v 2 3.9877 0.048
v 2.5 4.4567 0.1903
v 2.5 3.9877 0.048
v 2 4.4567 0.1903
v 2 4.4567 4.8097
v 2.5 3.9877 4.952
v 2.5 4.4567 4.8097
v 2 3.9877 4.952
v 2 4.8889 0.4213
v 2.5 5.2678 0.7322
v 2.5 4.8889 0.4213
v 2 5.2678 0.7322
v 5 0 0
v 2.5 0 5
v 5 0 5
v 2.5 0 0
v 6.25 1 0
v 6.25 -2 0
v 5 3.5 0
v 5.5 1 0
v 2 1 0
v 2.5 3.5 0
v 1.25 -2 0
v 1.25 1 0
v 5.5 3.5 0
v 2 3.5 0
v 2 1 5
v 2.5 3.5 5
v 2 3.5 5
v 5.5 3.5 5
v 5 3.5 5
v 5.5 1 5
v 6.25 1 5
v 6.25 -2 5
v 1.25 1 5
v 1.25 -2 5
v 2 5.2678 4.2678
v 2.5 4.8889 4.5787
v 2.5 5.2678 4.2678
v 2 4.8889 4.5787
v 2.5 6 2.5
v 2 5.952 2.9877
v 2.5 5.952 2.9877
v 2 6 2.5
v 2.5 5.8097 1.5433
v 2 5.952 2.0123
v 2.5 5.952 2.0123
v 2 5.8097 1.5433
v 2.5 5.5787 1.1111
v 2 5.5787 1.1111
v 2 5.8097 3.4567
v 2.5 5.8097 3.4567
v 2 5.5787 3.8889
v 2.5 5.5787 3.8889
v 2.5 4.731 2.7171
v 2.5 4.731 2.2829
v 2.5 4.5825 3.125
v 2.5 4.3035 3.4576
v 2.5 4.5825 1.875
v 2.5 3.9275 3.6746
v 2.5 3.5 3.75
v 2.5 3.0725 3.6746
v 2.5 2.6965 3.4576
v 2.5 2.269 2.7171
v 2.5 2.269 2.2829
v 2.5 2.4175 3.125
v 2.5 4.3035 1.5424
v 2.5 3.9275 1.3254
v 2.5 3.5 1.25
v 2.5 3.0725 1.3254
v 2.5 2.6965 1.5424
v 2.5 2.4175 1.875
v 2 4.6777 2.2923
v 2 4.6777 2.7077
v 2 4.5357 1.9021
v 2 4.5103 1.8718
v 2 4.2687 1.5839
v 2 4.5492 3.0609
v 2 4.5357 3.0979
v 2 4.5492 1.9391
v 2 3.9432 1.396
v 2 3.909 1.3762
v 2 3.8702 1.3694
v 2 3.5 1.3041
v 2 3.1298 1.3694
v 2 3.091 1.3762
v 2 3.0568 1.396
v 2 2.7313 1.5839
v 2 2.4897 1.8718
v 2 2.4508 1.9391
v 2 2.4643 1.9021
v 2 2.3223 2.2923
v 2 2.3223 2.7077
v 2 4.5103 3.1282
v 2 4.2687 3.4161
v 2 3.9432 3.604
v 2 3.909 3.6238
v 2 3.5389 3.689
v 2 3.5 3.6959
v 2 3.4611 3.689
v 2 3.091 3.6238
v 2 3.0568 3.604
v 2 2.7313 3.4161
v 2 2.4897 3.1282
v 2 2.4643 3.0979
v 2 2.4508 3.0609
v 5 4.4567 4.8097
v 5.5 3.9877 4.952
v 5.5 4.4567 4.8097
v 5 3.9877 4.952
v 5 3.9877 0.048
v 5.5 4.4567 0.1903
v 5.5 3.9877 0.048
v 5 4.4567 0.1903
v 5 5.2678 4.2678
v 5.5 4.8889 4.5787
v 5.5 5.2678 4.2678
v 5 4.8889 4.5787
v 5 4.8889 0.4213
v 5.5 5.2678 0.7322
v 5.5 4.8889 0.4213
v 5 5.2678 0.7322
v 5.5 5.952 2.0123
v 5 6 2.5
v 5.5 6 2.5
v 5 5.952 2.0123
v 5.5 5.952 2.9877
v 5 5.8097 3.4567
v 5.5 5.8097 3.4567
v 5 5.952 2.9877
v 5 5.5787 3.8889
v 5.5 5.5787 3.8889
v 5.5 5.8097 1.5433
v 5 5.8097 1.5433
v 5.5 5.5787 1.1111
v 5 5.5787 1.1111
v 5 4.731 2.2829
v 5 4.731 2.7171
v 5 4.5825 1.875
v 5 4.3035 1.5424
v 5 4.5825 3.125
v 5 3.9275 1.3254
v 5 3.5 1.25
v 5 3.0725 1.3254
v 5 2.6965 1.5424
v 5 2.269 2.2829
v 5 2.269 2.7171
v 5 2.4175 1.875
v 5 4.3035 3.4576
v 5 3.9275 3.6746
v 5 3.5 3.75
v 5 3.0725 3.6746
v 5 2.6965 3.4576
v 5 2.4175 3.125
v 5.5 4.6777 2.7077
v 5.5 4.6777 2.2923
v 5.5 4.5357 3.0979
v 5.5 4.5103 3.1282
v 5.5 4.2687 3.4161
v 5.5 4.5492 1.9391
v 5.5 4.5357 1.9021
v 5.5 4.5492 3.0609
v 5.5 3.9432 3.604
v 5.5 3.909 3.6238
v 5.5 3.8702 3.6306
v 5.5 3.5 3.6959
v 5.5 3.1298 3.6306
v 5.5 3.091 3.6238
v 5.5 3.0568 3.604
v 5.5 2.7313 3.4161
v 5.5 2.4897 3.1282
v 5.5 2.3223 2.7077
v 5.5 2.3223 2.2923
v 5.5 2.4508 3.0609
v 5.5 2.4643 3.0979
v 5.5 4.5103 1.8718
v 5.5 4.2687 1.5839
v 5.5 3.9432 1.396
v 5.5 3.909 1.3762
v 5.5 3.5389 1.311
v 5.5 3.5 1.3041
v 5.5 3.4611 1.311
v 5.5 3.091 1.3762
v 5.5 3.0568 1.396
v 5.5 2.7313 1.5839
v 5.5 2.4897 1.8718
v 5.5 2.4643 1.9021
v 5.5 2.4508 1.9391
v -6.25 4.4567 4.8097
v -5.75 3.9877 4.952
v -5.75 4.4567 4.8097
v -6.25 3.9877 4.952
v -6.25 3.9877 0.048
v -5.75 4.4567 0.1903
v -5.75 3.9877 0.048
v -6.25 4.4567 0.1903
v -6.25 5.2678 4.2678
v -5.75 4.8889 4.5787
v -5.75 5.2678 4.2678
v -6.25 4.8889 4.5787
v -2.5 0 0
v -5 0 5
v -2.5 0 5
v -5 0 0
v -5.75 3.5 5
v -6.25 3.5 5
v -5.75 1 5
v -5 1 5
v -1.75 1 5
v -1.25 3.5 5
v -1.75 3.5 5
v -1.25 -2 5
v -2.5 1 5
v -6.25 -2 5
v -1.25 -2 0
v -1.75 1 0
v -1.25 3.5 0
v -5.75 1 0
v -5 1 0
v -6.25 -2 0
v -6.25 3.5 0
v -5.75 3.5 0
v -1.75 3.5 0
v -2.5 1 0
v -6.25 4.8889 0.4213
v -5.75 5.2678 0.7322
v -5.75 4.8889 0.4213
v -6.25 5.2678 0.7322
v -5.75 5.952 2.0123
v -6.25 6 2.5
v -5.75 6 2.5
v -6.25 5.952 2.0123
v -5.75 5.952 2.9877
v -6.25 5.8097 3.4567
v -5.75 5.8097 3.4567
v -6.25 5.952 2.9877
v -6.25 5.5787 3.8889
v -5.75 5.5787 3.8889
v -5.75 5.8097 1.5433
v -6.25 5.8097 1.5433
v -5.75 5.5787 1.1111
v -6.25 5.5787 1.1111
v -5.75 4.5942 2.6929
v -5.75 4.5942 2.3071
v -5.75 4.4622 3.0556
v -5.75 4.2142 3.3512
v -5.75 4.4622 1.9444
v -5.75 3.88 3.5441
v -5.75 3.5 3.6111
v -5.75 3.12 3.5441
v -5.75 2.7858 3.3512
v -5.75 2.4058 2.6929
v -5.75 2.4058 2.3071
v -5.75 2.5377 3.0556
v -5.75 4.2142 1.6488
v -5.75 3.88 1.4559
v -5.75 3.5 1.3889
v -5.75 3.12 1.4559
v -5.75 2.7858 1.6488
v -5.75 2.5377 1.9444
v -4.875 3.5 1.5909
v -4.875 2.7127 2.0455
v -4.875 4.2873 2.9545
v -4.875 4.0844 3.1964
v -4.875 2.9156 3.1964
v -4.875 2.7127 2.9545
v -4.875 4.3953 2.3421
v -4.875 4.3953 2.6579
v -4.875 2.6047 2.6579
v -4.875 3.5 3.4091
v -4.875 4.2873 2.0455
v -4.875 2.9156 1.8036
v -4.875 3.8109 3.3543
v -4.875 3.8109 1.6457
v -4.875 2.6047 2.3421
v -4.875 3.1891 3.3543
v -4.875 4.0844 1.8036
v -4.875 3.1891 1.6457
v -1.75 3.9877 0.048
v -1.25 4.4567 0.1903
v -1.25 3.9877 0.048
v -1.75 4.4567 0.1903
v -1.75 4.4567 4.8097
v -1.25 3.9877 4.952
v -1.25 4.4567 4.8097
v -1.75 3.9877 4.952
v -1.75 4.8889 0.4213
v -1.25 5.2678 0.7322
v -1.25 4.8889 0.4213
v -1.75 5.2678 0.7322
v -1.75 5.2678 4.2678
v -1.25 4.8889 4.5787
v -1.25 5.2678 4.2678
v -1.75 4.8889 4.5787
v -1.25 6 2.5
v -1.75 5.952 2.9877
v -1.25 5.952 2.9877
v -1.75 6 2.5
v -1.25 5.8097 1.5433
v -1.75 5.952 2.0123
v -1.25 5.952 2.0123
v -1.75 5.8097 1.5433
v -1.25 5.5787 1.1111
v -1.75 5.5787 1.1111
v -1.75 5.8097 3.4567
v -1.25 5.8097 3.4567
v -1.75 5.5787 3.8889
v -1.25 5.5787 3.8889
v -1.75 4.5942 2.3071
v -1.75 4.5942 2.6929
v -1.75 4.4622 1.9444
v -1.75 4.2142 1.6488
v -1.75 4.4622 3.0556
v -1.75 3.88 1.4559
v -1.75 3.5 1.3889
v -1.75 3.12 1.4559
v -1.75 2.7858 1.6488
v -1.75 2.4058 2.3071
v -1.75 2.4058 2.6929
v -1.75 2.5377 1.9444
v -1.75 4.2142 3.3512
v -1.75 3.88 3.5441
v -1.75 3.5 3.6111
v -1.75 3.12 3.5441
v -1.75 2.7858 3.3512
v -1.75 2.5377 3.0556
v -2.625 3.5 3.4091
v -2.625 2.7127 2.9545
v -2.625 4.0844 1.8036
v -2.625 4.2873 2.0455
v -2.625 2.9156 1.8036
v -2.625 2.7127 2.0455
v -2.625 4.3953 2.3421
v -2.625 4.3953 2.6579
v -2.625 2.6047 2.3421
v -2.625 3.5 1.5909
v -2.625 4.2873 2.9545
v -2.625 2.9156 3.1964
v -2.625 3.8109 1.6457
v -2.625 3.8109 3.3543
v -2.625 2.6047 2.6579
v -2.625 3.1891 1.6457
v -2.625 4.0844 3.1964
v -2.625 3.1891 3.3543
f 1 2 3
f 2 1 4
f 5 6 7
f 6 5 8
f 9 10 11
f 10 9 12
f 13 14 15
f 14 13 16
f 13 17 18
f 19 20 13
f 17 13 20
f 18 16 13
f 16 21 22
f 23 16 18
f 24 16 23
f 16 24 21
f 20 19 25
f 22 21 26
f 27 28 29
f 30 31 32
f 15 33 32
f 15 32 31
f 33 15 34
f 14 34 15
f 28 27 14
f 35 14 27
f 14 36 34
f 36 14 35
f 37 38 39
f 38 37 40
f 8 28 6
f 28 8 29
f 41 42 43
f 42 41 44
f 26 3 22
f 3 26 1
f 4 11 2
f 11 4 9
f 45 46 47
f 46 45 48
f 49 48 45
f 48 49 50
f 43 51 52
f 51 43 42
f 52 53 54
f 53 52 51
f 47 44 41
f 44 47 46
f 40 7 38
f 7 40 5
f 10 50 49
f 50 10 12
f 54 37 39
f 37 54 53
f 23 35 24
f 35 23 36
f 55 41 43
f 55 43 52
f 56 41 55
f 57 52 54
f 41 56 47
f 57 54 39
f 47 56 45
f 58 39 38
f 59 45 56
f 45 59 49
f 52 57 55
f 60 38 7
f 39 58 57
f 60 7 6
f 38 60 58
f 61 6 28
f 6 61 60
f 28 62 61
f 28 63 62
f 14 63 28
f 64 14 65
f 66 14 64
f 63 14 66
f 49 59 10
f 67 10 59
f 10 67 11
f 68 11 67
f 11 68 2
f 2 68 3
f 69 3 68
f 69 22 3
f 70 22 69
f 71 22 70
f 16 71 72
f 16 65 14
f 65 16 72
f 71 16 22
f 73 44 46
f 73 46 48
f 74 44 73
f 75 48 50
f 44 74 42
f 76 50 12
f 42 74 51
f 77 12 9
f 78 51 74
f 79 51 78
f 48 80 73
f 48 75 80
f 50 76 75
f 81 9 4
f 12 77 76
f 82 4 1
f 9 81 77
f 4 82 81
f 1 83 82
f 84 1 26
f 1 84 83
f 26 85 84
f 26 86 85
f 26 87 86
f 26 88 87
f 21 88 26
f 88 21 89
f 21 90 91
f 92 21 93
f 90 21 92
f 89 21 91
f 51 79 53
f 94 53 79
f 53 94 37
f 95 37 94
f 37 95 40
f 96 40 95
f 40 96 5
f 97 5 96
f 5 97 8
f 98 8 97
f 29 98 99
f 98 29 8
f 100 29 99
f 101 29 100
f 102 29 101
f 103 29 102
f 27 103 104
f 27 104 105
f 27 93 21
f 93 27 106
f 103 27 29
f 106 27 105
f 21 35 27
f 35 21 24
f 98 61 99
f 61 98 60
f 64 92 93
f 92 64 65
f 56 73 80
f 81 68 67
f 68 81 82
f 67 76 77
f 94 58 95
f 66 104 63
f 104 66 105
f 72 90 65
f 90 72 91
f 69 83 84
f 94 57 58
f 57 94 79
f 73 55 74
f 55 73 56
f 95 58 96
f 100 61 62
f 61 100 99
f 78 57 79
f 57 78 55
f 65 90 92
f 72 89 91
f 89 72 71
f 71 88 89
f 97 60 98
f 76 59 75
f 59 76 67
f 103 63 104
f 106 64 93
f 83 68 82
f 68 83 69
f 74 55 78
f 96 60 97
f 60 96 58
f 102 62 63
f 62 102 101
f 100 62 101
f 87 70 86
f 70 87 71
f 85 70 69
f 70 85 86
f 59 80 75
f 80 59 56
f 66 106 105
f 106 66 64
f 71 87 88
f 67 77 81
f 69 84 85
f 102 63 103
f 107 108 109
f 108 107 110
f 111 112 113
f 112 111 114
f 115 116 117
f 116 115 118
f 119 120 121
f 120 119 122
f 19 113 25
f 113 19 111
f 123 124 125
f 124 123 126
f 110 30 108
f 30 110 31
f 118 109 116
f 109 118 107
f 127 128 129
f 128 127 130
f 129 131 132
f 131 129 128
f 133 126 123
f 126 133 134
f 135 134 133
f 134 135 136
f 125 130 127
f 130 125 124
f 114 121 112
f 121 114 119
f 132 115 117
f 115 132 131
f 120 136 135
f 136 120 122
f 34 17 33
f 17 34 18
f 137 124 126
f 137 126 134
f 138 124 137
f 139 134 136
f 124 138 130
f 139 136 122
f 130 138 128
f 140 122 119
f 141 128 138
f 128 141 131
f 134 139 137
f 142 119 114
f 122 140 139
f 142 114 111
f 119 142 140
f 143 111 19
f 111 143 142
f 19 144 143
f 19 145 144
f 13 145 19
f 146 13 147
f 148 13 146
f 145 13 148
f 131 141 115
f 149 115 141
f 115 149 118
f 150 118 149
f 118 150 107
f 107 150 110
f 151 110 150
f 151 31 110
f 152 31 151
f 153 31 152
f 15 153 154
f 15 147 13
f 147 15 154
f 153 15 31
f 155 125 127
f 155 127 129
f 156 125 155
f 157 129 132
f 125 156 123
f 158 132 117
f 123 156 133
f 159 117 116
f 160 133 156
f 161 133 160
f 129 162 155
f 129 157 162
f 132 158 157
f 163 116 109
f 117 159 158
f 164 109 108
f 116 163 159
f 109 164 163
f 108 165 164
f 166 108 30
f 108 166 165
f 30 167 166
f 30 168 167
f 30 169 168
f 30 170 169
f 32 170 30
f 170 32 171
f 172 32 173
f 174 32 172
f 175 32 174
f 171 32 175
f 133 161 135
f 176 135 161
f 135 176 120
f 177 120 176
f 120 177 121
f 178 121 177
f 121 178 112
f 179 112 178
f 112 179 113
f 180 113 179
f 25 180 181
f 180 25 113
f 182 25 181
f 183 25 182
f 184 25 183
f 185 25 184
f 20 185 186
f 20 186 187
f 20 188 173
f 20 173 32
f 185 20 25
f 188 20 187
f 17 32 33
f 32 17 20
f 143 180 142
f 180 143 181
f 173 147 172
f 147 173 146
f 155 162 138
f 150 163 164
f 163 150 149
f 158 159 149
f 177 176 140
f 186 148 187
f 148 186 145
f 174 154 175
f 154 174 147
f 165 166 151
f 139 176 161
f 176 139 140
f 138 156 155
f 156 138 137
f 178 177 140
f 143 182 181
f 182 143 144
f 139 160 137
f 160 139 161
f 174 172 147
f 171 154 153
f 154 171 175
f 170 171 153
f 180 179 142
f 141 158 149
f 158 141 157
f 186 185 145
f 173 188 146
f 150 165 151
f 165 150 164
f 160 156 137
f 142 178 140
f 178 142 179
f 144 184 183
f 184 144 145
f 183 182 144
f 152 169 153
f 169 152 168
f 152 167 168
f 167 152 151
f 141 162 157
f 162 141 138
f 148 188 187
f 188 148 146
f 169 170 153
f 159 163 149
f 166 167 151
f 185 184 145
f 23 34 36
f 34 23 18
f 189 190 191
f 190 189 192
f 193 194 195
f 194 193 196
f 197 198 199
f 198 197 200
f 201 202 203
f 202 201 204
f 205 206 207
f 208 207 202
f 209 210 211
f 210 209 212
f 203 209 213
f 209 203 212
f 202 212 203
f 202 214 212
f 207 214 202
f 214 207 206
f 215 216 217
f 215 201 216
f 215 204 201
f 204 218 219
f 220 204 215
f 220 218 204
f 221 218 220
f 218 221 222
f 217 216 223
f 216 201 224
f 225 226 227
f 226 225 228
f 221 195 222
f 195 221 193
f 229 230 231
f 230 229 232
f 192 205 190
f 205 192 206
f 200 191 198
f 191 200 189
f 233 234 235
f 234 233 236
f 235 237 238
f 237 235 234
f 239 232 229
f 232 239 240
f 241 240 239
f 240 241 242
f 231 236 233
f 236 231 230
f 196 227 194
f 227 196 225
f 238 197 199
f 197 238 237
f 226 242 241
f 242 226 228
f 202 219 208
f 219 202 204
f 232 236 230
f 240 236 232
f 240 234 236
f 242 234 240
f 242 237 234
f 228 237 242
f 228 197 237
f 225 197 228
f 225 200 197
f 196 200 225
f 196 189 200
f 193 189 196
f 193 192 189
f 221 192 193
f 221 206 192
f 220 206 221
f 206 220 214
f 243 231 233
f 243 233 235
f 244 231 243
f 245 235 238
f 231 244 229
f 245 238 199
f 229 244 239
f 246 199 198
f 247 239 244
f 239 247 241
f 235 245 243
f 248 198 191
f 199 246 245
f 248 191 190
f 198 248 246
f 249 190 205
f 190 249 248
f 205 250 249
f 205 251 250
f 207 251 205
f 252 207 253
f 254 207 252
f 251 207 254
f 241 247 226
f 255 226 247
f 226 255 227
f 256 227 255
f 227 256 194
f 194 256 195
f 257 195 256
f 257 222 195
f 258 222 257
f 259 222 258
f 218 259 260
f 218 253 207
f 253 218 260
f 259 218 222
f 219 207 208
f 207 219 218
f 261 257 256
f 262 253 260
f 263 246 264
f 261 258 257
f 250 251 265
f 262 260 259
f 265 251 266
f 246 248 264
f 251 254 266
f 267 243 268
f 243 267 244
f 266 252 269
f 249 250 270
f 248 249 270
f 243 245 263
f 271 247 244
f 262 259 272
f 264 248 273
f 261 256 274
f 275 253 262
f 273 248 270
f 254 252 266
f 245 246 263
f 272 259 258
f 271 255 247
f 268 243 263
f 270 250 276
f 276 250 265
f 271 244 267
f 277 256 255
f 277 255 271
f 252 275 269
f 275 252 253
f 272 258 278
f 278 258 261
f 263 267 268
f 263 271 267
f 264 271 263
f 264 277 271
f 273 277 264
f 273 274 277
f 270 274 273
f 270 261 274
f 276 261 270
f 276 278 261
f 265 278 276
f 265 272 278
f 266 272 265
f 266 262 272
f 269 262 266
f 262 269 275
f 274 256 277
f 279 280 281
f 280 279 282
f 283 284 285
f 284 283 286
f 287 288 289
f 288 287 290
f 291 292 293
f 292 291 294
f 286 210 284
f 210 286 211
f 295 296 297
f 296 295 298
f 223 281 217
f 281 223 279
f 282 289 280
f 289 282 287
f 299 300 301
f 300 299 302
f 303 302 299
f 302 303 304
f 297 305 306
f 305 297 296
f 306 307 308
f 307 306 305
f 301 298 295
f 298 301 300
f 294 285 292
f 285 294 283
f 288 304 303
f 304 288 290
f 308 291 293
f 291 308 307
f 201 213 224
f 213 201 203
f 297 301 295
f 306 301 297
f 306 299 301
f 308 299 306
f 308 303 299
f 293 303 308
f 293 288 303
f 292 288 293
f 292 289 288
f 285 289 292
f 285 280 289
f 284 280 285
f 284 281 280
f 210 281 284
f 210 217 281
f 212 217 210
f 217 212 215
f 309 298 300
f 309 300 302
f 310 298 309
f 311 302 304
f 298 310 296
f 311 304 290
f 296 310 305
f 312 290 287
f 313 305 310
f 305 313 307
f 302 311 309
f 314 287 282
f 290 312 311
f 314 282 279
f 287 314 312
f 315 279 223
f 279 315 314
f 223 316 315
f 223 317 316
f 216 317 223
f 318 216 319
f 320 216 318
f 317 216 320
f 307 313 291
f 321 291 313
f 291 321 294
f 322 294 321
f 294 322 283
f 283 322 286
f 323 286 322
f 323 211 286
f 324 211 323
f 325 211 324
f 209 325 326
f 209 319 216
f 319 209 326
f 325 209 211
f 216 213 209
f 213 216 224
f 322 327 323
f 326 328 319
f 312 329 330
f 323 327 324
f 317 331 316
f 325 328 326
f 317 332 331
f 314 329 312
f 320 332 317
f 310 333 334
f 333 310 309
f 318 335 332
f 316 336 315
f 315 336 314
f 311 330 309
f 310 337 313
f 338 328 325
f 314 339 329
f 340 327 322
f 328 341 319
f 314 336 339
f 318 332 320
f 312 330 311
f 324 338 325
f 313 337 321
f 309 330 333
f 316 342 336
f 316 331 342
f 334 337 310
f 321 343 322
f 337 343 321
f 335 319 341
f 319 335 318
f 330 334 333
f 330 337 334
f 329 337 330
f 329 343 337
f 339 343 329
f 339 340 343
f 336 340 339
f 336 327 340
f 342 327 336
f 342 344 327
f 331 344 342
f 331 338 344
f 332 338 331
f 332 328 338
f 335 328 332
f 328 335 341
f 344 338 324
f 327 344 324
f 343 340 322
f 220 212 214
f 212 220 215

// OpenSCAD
// file: common/helpers/getValue.scad
function getValue(variable, default) = variable == undef ? default : variable;
// file: common/joint/chain-joint.scad
/*

Generation a female / maile chain joint

After inclusion - use joint_f() or joint_m() modules as you like

Optional vars (with defaults):
JOINT_SIZE_X = 5;
JOINT_SIZE_Y = 5;
JOINT_SIZE_Z = 5;
*/

include <../helpers/getValue.scad>

JOINT_SIZE_X_ = getValue(JOINT_SIZE_X, 5);
JOINT_SIZE_Y_ = getValue(JOINT_SIZE_Y, 5);
JOINT_SIZE_Z_ = getValue(JOINT_SIZE_Z, 3);

JOINT_CYLINDER_H = 0.5;
JOINT_WALL_THICKNESS = JOINT_CYLINDER_H * 2.5;
JOINT_OUTER_WALL_THICKNESS = JOINT_CYLINDER_H;

RADIUS = JOINT_SIZE_Z_ / 2;

module joint_common_side() {
  difference() {
    hull() {
      translate([0, JOINT_SIZE_Y_ - RADIUS, RADIUS])
        rotate([0, 90, 0])
          cylinder(r = RADIUS, h = JOINT_WALL_THICKNESS, $fn = 32);
      cube([JOINT_WALL_THICKNESS, 1, JOINT_SIZE_Z_]);
    }
    translate([JOINT_OUTER_WALL_THICKNESS, JOINT_SIZE_Y_ - RADIUS * 2, 0])
      cube([JOINT_WALL_THICKNESS, RADIUS * 2.1, JOINT_SIZE_Z_]);
  }
}

module joint_side_m() {
  joint_common_side();
  translate([JOINT_CYLINDER_H, JOINT_SIZE_Y_ - RADIUS, JOINT_SIZE_Z_ / 2])
    rotate([0, 90, 0])
      cylinder(r = RADIUS / 2.25, r2 = RADIUS / 2.75, h = JOINT_CYLINDER_H * 1.75, $fn = 18);
}

module joint_side_f() {
  translate([JOINT_WALL_THICKNESS, 0, JOINT_SIZE_Z_]) {
    rotate([0, 180, 0]) {
        difference() {
        joint_common_side();
        translate([0, JOINT_SIZE_Y_ - RADIUS, JOINT_SIZE_Z_ / 2])
          rotate([0, 90, 0])
            cylinder(r = RADIUS / 2, r2 = RADIUS / 2.1, h = JOINT_CYLINDER_H * 1.1, $fn = 18);
        }
    }
  }
}

module joint_m() {
  translate([-JOINT_SIZE_X_ / 2, 0, 0]) {
      joint_side_m();
      translate([JOINT_SIZE_X_, 0, JOINT_SIZE_Z_])
        rotate([0, 180, 0])
          joint_side_m();
  }
}

module joint_f() {
  translate([-JOINT_SIZE_X_ / 2, 0, 0]) {
    joint_side_f();
    translate([JOINT_SIZE_X_, 0, JOINT_SIZE_Z_])
      rotate([0, 180, 0])
        joint_side_f();
  }
}
// main file
JOINT_SIZE_X = 5;
JOINT_SIZE_Y = 6;
JOINT_SIZE_Z = 5;

include <common/joint/chain-joint.scad>

BASE_SIZE = 2;

module base_m() {
    translate([0-JOINT_SIZE_X/2, -BASE_SIZE, 0]) cube([JOINT_SIZE_X, BASE_SIZE, JOINT_SIZE_Z]);
    joint_m();
}

module base_f() {
    translate([0-JOINT_SIZE_X/2, -BASE_SIZE, 0]) cube([JOINT_SIZE_X, BASE_SIZE, JOINT_SIZE_Z]);
    joint_f();
}

render() {
  translate([JOINT_SIZE_X * 0.75, 0, 0])
    base_f();
  translate([-JOINT_SIZE_X * 0.75, 0, 0])
    base_m();
}
